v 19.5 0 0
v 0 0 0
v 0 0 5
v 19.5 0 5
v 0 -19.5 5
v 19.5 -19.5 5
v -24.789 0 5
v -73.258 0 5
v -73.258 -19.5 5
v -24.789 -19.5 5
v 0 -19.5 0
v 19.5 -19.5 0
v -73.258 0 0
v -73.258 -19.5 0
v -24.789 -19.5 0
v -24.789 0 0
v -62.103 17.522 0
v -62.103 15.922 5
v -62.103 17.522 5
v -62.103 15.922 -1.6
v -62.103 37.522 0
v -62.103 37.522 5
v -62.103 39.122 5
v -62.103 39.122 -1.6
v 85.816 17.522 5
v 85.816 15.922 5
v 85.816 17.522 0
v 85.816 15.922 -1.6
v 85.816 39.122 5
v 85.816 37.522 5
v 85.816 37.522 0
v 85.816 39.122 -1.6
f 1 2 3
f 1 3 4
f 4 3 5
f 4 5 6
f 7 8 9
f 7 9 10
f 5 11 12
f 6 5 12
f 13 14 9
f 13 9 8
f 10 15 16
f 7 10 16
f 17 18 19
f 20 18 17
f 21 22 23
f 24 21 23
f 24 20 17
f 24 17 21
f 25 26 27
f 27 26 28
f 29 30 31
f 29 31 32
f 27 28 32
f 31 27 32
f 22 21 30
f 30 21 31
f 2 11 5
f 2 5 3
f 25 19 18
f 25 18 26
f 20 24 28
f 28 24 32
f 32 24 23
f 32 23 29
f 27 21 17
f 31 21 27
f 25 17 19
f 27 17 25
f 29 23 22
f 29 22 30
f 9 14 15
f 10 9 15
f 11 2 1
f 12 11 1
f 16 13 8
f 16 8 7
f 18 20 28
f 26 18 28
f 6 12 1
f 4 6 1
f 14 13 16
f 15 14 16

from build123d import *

# Parameters (mm, degrees)
F0_W     = 19.5
F0_H     = 19.5
F1_DEPTH = 5
F0_W_2   = 48.4686139971
F2_W     = 147.9186050977
F2_H     = 20
F3_DEPTH = 5
F4_T     = 1.6


with BuildPart() as f1:
    # F0 (on Top) → F1 (new body)
    with BuildSketch(Plane.XY):
        with Locations((9.75, -9.75)):
            Rectangle(F0_W, F0_H)
    extrude(amount=F1_DEPTH)


with BuildPart() as f1b:
    # F0 (on Top) → F1, piece 2 (new body)
    with BuildSketch(Plane.XY):
        with Locations((-49.0234224126, -9.75)):
            Rectangle(F0_W_2, F0_H)
    extrude(amount=F1_DEPTH)


with BuildPart() as f3:
    # F2 (on Top) → F3 (new body)
    with BuildSketch(Plane.XY):
        with Locations((11.8566602468, 27.5220619515)):
            Rectangle(F2_W, F2_H)
    extrude(amount=F3_DEPTH)

    # F4
    f4_openings = [f3.faces().sort_by_distance(p)[0] for p in [
        (11.85666, 27.522062, 5),
        (-62.102642, 27.522062, 2.5),
        (85.815963, 27.522062, 2.5),
    ]]
    offset(amount=F4_T, openings=f4_openings, kind=Kind.INTERSECTION)


solid = Compound([f1.part, f1b.part, f3.part])
